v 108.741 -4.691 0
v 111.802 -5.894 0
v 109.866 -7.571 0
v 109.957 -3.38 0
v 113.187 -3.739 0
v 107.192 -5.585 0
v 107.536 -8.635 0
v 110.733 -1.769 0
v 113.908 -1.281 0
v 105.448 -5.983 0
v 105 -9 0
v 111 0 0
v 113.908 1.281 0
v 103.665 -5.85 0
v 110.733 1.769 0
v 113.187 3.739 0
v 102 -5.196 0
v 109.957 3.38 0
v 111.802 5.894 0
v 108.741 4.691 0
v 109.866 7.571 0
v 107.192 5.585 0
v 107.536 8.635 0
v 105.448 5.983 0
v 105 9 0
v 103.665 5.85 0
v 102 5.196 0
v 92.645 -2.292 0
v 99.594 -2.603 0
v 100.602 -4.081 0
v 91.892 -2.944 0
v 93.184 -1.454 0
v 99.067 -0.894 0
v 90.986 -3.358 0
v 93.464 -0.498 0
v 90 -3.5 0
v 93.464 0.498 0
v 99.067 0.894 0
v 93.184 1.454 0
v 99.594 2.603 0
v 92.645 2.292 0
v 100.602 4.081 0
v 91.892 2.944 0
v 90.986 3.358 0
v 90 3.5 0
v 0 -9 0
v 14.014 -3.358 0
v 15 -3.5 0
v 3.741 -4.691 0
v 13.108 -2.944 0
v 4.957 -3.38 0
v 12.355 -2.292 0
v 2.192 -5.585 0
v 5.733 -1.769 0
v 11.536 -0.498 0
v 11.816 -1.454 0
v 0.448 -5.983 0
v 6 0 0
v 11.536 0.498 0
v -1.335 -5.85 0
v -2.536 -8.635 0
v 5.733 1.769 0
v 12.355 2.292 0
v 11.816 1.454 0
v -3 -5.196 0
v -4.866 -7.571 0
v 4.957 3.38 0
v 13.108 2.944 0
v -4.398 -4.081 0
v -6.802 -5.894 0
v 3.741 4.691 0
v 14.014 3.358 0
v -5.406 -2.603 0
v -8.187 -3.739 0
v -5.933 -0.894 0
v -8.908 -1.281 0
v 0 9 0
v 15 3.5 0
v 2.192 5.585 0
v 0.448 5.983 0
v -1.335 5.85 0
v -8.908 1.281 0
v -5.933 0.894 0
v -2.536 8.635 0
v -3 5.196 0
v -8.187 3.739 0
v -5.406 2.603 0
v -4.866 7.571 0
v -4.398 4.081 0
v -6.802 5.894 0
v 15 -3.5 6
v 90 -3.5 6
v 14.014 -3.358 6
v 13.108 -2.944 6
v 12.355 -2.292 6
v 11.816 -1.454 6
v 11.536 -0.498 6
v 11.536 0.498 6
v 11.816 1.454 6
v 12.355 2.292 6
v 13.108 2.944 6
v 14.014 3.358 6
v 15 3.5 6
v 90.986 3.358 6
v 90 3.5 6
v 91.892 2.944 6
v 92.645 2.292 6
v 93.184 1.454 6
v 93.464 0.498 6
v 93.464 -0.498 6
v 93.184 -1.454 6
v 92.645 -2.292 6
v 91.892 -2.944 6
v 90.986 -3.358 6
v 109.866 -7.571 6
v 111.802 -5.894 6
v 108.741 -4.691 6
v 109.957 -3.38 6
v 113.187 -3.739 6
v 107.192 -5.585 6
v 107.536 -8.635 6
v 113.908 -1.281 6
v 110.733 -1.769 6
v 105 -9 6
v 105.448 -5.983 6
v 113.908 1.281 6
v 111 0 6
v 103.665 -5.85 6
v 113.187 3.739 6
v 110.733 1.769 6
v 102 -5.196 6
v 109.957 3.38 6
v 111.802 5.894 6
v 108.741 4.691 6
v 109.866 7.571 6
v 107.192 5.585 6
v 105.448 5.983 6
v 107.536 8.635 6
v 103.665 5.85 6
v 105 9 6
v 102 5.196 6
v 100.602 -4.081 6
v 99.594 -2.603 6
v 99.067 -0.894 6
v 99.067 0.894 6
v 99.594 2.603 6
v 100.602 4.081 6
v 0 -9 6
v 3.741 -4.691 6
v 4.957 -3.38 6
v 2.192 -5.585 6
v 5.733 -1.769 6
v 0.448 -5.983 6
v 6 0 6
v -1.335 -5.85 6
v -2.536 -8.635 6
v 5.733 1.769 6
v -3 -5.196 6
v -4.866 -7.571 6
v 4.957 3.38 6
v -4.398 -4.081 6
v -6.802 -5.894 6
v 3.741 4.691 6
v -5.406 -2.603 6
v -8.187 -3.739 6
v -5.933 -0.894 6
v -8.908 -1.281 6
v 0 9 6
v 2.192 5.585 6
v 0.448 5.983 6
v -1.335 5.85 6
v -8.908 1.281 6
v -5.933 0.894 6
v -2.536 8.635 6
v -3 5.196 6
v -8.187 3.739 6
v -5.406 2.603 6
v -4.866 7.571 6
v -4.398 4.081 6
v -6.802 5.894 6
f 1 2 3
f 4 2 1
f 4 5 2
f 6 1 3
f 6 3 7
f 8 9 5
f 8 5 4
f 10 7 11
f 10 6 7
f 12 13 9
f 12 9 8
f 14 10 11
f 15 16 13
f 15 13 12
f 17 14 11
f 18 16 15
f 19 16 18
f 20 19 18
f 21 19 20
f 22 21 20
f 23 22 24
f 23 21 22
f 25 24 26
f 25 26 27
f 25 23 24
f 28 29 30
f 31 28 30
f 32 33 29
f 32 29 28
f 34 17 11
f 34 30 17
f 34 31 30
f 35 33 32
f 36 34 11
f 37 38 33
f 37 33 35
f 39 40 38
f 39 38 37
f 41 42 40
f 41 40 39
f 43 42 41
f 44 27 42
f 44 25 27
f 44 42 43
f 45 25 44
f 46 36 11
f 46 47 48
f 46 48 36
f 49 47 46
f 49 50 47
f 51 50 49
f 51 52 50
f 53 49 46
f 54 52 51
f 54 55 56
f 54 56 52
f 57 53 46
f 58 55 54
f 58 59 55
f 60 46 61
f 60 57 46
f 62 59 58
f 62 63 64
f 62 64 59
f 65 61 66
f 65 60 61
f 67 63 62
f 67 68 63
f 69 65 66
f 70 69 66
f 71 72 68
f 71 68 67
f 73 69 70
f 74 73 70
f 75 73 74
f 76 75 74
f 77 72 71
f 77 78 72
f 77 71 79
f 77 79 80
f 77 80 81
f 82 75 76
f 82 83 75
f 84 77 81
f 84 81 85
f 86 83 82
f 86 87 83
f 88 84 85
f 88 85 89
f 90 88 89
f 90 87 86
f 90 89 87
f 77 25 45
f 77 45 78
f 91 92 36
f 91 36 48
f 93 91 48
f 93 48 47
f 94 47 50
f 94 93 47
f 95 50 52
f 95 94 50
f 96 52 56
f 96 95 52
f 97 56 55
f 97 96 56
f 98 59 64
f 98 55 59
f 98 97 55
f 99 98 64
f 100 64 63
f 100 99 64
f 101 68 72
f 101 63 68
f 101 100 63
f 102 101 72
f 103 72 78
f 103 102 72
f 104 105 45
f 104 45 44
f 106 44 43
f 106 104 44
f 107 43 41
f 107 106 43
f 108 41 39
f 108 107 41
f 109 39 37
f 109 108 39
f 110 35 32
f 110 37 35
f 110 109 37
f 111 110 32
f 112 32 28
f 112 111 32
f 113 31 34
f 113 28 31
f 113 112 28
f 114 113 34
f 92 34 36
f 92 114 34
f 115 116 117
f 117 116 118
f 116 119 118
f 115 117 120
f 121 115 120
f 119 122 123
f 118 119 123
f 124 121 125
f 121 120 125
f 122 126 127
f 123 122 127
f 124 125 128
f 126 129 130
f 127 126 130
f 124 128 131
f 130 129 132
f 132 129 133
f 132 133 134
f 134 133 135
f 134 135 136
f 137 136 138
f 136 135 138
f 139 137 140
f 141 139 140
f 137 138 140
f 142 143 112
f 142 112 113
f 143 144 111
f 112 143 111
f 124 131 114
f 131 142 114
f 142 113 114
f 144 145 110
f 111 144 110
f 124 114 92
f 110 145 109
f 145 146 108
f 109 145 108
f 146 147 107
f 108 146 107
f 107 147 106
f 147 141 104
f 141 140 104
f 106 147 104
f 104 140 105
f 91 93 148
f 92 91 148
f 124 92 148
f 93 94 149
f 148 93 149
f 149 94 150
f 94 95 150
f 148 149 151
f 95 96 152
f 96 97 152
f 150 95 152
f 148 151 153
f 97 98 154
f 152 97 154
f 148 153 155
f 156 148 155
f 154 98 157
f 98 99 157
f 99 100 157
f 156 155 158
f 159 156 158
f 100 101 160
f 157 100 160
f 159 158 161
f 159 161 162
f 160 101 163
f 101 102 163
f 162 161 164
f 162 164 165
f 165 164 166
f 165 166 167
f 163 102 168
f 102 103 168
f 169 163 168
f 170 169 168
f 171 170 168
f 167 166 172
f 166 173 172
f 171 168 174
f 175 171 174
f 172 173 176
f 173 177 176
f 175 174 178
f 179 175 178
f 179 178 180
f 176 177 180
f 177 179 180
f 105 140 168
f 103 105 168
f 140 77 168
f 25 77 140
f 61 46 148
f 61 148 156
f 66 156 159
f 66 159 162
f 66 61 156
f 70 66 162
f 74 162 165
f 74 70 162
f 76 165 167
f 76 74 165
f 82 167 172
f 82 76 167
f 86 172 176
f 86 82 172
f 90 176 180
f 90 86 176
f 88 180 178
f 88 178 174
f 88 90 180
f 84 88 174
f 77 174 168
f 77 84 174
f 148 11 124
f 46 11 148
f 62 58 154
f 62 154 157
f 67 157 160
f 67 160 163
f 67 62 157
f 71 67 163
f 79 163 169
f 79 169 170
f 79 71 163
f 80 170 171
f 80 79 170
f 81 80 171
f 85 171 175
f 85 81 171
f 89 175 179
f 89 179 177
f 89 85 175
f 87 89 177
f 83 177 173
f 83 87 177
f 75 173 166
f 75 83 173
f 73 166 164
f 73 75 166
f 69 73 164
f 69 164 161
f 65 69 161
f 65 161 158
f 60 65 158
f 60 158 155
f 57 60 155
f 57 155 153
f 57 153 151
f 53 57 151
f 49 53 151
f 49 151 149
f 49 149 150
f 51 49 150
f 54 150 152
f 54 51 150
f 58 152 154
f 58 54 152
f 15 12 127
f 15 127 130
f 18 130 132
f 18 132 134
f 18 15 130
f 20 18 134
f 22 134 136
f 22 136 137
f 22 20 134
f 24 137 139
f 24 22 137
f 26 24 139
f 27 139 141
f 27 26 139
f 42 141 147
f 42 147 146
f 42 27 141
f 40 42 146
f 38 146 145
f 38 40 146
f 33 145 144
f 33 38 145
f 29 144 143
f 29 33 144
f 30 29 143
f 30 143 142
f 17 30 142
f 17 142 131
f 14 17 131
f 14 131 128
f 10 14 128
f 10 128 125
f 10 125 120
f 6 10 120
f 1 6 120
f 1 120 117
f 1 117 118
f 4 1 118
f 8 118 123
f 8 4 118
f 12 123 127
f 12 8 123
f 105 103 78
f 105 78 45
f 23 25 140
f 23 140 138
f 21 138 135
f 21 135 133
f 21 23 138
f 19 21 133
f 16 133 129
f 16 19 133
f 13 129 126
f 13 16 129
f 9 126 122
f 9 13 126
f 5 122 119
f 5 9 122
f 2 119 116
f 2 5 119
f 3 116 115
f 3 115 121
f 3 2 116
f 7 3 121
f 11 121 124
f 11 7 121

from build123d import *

# Parameters (mm, degrees)
SKETCH_1_R          = 6
EXTRUDE_1_DEPTH     = 6
CUT_EXTRUDE_1_DEPTH = 10


with BuildPart() as part:
    # 草图1 → 凸台-拉伸1 (new body)
    with BuildSketch(Plane.XY):
        with BuildLine():
            Line((0, 9), (105, 9))
            ThreePointArc((105, 9), (114, 0), (105, -9))
            Line((105, -9), (0, -9))
            ThreePointArc((0, -9), (-9, 0), (0, 9))
        make_face()
        Circle(SKETCH_1_R, mode=Mode.SUBTRACT)
        with Locations((105, 0)):
            Circle(SKETCH_1_R, mode=Mode.SUBTRACT)
    extrude(amount=EXTRUDE_1_DEPTH)

    # 草图2 → 切除-拉伸1 (cut)
    with BuildSketch(Plane.XY.offset(6)):
        with BuildLine():
            Line((15, 3.5), (90, 3.5))
            ThreePointArc((90, 3.5), (93.5, 0), (90, -3.5))
            Line((90, -3.5), (15, -3.5))
            ThreePointArc((15, -3.5), (11.5, 0), (15, 3.5))
        make_face()
    extrude(amount=-CUT_EXTRUDE_1_DEPTH, mode=Mode.SUBTRACT)


solid = part.part
